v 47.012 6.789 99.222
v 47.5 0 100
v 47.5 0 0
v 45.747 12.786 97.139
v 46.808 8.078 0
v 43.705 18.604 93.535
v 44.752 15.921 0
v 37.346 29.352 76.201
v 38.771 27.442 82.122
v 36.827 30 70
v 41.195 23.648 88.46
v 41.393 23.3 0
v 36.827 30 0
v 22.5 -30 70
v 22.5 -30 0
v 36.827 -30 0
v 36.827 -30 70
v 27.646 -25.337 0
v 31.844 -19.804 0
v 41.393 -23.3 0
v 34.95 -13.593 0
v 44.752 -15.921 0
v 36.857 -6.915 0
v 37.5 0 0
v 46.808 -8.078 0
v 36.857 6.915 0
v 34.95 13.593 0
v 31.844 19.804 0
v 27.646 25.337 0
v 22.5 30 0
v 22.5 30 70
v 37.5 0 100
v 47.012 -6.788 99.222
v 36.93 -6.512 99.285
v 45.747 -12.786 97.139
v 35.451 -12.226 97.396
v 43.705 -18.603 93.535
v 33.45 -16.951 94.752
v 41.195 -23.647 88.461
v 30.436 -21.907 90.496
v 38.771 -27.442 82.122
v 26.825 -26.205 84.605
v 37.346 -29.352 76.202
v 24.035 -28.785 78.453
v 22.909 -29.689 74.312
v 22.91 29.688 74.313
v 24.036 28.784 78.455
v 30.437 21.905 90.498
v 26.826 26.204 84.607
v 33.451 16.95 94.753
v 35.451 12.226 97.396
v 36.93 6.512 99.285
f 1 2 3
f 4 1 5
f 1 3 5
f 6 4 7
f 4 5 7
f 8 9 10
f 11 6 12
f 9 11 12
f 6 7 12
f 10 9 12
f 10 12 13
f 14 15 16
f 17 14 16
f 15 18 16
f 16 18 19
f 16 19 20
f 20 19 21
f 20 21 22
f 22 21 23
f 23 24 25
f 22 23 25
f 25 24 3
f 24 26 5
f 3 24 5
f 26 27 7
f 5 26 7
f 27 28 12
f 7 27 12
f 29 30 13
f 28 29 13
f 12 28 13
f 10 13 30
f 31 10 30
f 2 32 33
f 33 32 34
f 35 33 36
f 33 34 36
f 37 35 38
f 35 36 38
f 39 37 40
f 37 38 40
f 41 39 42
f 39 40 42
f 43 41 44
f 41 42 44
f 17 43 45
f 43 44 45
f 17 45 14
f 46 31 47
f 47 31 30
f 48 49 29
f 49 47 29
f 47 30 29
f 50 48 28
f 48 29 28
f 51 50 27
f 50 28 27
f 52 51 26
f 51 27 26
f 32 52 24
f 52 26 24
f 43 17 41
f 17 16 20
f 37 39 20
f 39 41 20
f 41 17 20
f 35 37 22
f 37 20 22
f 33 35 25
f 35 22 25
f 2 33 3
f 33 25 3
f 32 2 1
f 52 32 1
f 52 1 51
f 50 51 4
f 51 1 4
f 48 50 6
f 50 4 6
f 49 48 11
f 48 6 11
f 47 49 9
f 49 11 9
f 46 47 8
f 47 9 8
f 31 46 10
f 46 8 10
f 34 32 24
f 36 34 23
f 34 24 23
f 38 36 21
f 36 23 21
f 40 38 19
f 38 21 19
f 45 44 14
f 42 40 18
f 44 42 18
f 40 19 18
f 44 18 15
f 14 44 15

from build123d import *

# Parameters (mm, degrees)
BOSS_EXTRU_1_DEPTH = 100
CONG_1_R           = 30


with BuildPart() as part:
    # Esquisse1 → Boss.-Extru.1 (new body)
    with BuildSketch(Plane.XY):
        with BuildLine():
            Line((36.827299657, 30), (22.5, 30))
            ThreePointArc((22.5, 30), (33.541019662, 16.770509831), (37.5, 0))
            ThreePointArc((37.5, 0), (33.541019662, -16.770509831), (22.5, -30))
            Line((22.5, -30), (36.827299657, -30))
            ThreePointArc((36.827299657, -30), (44.752355992, -15.920949505), (47.5, 0))
            ThreePointArc((47.5, 0), (44.752355992, 15.920949505), (36.827299657, 30))
        make_face()
    extrude(amount=BOSS_EXTRU_1_DEPTH)

    # Congé1
    # the kernel refuses this fillet: 30 mm, written as the material it takes off along each edge
    with BuildSketch(Plane(origin=(111.827299657, 30, 100), x_dir=(0, 0, -1), z_dir=(-1, 0, 0))) as cong_1_piece_1:
        with BuildLine():
            CenterArc((CONG_1_R, CONG_1_R), CONG_1_R, 180, 90)
            Line((0, CONG_1_R), (0, 0))
            Line((0, 0), (CONG_1_R, 0))
        make_face()
    extrude(amount=164.327299657, mode=Mode.SUBTRACT)
    with BuildSketch(Plane(origin=(-52.5, -30, 100), x_dir=(0, 1, 0), z_dir=(1, 0, 0))) as cong_1_piece_2:
        with BuildLine():
            CenterArc((CONG_1_R, -CONG_1_R), CONG_1_R, 90, 90)
            Line((0, -CONG_1_R), (0, 0))
            Line((0, 0), (CONG_1_R, 0))
        make_face()
    extrude(amount=164.327299657, mode=Mode.SUBTRACT)


solid = part.part
